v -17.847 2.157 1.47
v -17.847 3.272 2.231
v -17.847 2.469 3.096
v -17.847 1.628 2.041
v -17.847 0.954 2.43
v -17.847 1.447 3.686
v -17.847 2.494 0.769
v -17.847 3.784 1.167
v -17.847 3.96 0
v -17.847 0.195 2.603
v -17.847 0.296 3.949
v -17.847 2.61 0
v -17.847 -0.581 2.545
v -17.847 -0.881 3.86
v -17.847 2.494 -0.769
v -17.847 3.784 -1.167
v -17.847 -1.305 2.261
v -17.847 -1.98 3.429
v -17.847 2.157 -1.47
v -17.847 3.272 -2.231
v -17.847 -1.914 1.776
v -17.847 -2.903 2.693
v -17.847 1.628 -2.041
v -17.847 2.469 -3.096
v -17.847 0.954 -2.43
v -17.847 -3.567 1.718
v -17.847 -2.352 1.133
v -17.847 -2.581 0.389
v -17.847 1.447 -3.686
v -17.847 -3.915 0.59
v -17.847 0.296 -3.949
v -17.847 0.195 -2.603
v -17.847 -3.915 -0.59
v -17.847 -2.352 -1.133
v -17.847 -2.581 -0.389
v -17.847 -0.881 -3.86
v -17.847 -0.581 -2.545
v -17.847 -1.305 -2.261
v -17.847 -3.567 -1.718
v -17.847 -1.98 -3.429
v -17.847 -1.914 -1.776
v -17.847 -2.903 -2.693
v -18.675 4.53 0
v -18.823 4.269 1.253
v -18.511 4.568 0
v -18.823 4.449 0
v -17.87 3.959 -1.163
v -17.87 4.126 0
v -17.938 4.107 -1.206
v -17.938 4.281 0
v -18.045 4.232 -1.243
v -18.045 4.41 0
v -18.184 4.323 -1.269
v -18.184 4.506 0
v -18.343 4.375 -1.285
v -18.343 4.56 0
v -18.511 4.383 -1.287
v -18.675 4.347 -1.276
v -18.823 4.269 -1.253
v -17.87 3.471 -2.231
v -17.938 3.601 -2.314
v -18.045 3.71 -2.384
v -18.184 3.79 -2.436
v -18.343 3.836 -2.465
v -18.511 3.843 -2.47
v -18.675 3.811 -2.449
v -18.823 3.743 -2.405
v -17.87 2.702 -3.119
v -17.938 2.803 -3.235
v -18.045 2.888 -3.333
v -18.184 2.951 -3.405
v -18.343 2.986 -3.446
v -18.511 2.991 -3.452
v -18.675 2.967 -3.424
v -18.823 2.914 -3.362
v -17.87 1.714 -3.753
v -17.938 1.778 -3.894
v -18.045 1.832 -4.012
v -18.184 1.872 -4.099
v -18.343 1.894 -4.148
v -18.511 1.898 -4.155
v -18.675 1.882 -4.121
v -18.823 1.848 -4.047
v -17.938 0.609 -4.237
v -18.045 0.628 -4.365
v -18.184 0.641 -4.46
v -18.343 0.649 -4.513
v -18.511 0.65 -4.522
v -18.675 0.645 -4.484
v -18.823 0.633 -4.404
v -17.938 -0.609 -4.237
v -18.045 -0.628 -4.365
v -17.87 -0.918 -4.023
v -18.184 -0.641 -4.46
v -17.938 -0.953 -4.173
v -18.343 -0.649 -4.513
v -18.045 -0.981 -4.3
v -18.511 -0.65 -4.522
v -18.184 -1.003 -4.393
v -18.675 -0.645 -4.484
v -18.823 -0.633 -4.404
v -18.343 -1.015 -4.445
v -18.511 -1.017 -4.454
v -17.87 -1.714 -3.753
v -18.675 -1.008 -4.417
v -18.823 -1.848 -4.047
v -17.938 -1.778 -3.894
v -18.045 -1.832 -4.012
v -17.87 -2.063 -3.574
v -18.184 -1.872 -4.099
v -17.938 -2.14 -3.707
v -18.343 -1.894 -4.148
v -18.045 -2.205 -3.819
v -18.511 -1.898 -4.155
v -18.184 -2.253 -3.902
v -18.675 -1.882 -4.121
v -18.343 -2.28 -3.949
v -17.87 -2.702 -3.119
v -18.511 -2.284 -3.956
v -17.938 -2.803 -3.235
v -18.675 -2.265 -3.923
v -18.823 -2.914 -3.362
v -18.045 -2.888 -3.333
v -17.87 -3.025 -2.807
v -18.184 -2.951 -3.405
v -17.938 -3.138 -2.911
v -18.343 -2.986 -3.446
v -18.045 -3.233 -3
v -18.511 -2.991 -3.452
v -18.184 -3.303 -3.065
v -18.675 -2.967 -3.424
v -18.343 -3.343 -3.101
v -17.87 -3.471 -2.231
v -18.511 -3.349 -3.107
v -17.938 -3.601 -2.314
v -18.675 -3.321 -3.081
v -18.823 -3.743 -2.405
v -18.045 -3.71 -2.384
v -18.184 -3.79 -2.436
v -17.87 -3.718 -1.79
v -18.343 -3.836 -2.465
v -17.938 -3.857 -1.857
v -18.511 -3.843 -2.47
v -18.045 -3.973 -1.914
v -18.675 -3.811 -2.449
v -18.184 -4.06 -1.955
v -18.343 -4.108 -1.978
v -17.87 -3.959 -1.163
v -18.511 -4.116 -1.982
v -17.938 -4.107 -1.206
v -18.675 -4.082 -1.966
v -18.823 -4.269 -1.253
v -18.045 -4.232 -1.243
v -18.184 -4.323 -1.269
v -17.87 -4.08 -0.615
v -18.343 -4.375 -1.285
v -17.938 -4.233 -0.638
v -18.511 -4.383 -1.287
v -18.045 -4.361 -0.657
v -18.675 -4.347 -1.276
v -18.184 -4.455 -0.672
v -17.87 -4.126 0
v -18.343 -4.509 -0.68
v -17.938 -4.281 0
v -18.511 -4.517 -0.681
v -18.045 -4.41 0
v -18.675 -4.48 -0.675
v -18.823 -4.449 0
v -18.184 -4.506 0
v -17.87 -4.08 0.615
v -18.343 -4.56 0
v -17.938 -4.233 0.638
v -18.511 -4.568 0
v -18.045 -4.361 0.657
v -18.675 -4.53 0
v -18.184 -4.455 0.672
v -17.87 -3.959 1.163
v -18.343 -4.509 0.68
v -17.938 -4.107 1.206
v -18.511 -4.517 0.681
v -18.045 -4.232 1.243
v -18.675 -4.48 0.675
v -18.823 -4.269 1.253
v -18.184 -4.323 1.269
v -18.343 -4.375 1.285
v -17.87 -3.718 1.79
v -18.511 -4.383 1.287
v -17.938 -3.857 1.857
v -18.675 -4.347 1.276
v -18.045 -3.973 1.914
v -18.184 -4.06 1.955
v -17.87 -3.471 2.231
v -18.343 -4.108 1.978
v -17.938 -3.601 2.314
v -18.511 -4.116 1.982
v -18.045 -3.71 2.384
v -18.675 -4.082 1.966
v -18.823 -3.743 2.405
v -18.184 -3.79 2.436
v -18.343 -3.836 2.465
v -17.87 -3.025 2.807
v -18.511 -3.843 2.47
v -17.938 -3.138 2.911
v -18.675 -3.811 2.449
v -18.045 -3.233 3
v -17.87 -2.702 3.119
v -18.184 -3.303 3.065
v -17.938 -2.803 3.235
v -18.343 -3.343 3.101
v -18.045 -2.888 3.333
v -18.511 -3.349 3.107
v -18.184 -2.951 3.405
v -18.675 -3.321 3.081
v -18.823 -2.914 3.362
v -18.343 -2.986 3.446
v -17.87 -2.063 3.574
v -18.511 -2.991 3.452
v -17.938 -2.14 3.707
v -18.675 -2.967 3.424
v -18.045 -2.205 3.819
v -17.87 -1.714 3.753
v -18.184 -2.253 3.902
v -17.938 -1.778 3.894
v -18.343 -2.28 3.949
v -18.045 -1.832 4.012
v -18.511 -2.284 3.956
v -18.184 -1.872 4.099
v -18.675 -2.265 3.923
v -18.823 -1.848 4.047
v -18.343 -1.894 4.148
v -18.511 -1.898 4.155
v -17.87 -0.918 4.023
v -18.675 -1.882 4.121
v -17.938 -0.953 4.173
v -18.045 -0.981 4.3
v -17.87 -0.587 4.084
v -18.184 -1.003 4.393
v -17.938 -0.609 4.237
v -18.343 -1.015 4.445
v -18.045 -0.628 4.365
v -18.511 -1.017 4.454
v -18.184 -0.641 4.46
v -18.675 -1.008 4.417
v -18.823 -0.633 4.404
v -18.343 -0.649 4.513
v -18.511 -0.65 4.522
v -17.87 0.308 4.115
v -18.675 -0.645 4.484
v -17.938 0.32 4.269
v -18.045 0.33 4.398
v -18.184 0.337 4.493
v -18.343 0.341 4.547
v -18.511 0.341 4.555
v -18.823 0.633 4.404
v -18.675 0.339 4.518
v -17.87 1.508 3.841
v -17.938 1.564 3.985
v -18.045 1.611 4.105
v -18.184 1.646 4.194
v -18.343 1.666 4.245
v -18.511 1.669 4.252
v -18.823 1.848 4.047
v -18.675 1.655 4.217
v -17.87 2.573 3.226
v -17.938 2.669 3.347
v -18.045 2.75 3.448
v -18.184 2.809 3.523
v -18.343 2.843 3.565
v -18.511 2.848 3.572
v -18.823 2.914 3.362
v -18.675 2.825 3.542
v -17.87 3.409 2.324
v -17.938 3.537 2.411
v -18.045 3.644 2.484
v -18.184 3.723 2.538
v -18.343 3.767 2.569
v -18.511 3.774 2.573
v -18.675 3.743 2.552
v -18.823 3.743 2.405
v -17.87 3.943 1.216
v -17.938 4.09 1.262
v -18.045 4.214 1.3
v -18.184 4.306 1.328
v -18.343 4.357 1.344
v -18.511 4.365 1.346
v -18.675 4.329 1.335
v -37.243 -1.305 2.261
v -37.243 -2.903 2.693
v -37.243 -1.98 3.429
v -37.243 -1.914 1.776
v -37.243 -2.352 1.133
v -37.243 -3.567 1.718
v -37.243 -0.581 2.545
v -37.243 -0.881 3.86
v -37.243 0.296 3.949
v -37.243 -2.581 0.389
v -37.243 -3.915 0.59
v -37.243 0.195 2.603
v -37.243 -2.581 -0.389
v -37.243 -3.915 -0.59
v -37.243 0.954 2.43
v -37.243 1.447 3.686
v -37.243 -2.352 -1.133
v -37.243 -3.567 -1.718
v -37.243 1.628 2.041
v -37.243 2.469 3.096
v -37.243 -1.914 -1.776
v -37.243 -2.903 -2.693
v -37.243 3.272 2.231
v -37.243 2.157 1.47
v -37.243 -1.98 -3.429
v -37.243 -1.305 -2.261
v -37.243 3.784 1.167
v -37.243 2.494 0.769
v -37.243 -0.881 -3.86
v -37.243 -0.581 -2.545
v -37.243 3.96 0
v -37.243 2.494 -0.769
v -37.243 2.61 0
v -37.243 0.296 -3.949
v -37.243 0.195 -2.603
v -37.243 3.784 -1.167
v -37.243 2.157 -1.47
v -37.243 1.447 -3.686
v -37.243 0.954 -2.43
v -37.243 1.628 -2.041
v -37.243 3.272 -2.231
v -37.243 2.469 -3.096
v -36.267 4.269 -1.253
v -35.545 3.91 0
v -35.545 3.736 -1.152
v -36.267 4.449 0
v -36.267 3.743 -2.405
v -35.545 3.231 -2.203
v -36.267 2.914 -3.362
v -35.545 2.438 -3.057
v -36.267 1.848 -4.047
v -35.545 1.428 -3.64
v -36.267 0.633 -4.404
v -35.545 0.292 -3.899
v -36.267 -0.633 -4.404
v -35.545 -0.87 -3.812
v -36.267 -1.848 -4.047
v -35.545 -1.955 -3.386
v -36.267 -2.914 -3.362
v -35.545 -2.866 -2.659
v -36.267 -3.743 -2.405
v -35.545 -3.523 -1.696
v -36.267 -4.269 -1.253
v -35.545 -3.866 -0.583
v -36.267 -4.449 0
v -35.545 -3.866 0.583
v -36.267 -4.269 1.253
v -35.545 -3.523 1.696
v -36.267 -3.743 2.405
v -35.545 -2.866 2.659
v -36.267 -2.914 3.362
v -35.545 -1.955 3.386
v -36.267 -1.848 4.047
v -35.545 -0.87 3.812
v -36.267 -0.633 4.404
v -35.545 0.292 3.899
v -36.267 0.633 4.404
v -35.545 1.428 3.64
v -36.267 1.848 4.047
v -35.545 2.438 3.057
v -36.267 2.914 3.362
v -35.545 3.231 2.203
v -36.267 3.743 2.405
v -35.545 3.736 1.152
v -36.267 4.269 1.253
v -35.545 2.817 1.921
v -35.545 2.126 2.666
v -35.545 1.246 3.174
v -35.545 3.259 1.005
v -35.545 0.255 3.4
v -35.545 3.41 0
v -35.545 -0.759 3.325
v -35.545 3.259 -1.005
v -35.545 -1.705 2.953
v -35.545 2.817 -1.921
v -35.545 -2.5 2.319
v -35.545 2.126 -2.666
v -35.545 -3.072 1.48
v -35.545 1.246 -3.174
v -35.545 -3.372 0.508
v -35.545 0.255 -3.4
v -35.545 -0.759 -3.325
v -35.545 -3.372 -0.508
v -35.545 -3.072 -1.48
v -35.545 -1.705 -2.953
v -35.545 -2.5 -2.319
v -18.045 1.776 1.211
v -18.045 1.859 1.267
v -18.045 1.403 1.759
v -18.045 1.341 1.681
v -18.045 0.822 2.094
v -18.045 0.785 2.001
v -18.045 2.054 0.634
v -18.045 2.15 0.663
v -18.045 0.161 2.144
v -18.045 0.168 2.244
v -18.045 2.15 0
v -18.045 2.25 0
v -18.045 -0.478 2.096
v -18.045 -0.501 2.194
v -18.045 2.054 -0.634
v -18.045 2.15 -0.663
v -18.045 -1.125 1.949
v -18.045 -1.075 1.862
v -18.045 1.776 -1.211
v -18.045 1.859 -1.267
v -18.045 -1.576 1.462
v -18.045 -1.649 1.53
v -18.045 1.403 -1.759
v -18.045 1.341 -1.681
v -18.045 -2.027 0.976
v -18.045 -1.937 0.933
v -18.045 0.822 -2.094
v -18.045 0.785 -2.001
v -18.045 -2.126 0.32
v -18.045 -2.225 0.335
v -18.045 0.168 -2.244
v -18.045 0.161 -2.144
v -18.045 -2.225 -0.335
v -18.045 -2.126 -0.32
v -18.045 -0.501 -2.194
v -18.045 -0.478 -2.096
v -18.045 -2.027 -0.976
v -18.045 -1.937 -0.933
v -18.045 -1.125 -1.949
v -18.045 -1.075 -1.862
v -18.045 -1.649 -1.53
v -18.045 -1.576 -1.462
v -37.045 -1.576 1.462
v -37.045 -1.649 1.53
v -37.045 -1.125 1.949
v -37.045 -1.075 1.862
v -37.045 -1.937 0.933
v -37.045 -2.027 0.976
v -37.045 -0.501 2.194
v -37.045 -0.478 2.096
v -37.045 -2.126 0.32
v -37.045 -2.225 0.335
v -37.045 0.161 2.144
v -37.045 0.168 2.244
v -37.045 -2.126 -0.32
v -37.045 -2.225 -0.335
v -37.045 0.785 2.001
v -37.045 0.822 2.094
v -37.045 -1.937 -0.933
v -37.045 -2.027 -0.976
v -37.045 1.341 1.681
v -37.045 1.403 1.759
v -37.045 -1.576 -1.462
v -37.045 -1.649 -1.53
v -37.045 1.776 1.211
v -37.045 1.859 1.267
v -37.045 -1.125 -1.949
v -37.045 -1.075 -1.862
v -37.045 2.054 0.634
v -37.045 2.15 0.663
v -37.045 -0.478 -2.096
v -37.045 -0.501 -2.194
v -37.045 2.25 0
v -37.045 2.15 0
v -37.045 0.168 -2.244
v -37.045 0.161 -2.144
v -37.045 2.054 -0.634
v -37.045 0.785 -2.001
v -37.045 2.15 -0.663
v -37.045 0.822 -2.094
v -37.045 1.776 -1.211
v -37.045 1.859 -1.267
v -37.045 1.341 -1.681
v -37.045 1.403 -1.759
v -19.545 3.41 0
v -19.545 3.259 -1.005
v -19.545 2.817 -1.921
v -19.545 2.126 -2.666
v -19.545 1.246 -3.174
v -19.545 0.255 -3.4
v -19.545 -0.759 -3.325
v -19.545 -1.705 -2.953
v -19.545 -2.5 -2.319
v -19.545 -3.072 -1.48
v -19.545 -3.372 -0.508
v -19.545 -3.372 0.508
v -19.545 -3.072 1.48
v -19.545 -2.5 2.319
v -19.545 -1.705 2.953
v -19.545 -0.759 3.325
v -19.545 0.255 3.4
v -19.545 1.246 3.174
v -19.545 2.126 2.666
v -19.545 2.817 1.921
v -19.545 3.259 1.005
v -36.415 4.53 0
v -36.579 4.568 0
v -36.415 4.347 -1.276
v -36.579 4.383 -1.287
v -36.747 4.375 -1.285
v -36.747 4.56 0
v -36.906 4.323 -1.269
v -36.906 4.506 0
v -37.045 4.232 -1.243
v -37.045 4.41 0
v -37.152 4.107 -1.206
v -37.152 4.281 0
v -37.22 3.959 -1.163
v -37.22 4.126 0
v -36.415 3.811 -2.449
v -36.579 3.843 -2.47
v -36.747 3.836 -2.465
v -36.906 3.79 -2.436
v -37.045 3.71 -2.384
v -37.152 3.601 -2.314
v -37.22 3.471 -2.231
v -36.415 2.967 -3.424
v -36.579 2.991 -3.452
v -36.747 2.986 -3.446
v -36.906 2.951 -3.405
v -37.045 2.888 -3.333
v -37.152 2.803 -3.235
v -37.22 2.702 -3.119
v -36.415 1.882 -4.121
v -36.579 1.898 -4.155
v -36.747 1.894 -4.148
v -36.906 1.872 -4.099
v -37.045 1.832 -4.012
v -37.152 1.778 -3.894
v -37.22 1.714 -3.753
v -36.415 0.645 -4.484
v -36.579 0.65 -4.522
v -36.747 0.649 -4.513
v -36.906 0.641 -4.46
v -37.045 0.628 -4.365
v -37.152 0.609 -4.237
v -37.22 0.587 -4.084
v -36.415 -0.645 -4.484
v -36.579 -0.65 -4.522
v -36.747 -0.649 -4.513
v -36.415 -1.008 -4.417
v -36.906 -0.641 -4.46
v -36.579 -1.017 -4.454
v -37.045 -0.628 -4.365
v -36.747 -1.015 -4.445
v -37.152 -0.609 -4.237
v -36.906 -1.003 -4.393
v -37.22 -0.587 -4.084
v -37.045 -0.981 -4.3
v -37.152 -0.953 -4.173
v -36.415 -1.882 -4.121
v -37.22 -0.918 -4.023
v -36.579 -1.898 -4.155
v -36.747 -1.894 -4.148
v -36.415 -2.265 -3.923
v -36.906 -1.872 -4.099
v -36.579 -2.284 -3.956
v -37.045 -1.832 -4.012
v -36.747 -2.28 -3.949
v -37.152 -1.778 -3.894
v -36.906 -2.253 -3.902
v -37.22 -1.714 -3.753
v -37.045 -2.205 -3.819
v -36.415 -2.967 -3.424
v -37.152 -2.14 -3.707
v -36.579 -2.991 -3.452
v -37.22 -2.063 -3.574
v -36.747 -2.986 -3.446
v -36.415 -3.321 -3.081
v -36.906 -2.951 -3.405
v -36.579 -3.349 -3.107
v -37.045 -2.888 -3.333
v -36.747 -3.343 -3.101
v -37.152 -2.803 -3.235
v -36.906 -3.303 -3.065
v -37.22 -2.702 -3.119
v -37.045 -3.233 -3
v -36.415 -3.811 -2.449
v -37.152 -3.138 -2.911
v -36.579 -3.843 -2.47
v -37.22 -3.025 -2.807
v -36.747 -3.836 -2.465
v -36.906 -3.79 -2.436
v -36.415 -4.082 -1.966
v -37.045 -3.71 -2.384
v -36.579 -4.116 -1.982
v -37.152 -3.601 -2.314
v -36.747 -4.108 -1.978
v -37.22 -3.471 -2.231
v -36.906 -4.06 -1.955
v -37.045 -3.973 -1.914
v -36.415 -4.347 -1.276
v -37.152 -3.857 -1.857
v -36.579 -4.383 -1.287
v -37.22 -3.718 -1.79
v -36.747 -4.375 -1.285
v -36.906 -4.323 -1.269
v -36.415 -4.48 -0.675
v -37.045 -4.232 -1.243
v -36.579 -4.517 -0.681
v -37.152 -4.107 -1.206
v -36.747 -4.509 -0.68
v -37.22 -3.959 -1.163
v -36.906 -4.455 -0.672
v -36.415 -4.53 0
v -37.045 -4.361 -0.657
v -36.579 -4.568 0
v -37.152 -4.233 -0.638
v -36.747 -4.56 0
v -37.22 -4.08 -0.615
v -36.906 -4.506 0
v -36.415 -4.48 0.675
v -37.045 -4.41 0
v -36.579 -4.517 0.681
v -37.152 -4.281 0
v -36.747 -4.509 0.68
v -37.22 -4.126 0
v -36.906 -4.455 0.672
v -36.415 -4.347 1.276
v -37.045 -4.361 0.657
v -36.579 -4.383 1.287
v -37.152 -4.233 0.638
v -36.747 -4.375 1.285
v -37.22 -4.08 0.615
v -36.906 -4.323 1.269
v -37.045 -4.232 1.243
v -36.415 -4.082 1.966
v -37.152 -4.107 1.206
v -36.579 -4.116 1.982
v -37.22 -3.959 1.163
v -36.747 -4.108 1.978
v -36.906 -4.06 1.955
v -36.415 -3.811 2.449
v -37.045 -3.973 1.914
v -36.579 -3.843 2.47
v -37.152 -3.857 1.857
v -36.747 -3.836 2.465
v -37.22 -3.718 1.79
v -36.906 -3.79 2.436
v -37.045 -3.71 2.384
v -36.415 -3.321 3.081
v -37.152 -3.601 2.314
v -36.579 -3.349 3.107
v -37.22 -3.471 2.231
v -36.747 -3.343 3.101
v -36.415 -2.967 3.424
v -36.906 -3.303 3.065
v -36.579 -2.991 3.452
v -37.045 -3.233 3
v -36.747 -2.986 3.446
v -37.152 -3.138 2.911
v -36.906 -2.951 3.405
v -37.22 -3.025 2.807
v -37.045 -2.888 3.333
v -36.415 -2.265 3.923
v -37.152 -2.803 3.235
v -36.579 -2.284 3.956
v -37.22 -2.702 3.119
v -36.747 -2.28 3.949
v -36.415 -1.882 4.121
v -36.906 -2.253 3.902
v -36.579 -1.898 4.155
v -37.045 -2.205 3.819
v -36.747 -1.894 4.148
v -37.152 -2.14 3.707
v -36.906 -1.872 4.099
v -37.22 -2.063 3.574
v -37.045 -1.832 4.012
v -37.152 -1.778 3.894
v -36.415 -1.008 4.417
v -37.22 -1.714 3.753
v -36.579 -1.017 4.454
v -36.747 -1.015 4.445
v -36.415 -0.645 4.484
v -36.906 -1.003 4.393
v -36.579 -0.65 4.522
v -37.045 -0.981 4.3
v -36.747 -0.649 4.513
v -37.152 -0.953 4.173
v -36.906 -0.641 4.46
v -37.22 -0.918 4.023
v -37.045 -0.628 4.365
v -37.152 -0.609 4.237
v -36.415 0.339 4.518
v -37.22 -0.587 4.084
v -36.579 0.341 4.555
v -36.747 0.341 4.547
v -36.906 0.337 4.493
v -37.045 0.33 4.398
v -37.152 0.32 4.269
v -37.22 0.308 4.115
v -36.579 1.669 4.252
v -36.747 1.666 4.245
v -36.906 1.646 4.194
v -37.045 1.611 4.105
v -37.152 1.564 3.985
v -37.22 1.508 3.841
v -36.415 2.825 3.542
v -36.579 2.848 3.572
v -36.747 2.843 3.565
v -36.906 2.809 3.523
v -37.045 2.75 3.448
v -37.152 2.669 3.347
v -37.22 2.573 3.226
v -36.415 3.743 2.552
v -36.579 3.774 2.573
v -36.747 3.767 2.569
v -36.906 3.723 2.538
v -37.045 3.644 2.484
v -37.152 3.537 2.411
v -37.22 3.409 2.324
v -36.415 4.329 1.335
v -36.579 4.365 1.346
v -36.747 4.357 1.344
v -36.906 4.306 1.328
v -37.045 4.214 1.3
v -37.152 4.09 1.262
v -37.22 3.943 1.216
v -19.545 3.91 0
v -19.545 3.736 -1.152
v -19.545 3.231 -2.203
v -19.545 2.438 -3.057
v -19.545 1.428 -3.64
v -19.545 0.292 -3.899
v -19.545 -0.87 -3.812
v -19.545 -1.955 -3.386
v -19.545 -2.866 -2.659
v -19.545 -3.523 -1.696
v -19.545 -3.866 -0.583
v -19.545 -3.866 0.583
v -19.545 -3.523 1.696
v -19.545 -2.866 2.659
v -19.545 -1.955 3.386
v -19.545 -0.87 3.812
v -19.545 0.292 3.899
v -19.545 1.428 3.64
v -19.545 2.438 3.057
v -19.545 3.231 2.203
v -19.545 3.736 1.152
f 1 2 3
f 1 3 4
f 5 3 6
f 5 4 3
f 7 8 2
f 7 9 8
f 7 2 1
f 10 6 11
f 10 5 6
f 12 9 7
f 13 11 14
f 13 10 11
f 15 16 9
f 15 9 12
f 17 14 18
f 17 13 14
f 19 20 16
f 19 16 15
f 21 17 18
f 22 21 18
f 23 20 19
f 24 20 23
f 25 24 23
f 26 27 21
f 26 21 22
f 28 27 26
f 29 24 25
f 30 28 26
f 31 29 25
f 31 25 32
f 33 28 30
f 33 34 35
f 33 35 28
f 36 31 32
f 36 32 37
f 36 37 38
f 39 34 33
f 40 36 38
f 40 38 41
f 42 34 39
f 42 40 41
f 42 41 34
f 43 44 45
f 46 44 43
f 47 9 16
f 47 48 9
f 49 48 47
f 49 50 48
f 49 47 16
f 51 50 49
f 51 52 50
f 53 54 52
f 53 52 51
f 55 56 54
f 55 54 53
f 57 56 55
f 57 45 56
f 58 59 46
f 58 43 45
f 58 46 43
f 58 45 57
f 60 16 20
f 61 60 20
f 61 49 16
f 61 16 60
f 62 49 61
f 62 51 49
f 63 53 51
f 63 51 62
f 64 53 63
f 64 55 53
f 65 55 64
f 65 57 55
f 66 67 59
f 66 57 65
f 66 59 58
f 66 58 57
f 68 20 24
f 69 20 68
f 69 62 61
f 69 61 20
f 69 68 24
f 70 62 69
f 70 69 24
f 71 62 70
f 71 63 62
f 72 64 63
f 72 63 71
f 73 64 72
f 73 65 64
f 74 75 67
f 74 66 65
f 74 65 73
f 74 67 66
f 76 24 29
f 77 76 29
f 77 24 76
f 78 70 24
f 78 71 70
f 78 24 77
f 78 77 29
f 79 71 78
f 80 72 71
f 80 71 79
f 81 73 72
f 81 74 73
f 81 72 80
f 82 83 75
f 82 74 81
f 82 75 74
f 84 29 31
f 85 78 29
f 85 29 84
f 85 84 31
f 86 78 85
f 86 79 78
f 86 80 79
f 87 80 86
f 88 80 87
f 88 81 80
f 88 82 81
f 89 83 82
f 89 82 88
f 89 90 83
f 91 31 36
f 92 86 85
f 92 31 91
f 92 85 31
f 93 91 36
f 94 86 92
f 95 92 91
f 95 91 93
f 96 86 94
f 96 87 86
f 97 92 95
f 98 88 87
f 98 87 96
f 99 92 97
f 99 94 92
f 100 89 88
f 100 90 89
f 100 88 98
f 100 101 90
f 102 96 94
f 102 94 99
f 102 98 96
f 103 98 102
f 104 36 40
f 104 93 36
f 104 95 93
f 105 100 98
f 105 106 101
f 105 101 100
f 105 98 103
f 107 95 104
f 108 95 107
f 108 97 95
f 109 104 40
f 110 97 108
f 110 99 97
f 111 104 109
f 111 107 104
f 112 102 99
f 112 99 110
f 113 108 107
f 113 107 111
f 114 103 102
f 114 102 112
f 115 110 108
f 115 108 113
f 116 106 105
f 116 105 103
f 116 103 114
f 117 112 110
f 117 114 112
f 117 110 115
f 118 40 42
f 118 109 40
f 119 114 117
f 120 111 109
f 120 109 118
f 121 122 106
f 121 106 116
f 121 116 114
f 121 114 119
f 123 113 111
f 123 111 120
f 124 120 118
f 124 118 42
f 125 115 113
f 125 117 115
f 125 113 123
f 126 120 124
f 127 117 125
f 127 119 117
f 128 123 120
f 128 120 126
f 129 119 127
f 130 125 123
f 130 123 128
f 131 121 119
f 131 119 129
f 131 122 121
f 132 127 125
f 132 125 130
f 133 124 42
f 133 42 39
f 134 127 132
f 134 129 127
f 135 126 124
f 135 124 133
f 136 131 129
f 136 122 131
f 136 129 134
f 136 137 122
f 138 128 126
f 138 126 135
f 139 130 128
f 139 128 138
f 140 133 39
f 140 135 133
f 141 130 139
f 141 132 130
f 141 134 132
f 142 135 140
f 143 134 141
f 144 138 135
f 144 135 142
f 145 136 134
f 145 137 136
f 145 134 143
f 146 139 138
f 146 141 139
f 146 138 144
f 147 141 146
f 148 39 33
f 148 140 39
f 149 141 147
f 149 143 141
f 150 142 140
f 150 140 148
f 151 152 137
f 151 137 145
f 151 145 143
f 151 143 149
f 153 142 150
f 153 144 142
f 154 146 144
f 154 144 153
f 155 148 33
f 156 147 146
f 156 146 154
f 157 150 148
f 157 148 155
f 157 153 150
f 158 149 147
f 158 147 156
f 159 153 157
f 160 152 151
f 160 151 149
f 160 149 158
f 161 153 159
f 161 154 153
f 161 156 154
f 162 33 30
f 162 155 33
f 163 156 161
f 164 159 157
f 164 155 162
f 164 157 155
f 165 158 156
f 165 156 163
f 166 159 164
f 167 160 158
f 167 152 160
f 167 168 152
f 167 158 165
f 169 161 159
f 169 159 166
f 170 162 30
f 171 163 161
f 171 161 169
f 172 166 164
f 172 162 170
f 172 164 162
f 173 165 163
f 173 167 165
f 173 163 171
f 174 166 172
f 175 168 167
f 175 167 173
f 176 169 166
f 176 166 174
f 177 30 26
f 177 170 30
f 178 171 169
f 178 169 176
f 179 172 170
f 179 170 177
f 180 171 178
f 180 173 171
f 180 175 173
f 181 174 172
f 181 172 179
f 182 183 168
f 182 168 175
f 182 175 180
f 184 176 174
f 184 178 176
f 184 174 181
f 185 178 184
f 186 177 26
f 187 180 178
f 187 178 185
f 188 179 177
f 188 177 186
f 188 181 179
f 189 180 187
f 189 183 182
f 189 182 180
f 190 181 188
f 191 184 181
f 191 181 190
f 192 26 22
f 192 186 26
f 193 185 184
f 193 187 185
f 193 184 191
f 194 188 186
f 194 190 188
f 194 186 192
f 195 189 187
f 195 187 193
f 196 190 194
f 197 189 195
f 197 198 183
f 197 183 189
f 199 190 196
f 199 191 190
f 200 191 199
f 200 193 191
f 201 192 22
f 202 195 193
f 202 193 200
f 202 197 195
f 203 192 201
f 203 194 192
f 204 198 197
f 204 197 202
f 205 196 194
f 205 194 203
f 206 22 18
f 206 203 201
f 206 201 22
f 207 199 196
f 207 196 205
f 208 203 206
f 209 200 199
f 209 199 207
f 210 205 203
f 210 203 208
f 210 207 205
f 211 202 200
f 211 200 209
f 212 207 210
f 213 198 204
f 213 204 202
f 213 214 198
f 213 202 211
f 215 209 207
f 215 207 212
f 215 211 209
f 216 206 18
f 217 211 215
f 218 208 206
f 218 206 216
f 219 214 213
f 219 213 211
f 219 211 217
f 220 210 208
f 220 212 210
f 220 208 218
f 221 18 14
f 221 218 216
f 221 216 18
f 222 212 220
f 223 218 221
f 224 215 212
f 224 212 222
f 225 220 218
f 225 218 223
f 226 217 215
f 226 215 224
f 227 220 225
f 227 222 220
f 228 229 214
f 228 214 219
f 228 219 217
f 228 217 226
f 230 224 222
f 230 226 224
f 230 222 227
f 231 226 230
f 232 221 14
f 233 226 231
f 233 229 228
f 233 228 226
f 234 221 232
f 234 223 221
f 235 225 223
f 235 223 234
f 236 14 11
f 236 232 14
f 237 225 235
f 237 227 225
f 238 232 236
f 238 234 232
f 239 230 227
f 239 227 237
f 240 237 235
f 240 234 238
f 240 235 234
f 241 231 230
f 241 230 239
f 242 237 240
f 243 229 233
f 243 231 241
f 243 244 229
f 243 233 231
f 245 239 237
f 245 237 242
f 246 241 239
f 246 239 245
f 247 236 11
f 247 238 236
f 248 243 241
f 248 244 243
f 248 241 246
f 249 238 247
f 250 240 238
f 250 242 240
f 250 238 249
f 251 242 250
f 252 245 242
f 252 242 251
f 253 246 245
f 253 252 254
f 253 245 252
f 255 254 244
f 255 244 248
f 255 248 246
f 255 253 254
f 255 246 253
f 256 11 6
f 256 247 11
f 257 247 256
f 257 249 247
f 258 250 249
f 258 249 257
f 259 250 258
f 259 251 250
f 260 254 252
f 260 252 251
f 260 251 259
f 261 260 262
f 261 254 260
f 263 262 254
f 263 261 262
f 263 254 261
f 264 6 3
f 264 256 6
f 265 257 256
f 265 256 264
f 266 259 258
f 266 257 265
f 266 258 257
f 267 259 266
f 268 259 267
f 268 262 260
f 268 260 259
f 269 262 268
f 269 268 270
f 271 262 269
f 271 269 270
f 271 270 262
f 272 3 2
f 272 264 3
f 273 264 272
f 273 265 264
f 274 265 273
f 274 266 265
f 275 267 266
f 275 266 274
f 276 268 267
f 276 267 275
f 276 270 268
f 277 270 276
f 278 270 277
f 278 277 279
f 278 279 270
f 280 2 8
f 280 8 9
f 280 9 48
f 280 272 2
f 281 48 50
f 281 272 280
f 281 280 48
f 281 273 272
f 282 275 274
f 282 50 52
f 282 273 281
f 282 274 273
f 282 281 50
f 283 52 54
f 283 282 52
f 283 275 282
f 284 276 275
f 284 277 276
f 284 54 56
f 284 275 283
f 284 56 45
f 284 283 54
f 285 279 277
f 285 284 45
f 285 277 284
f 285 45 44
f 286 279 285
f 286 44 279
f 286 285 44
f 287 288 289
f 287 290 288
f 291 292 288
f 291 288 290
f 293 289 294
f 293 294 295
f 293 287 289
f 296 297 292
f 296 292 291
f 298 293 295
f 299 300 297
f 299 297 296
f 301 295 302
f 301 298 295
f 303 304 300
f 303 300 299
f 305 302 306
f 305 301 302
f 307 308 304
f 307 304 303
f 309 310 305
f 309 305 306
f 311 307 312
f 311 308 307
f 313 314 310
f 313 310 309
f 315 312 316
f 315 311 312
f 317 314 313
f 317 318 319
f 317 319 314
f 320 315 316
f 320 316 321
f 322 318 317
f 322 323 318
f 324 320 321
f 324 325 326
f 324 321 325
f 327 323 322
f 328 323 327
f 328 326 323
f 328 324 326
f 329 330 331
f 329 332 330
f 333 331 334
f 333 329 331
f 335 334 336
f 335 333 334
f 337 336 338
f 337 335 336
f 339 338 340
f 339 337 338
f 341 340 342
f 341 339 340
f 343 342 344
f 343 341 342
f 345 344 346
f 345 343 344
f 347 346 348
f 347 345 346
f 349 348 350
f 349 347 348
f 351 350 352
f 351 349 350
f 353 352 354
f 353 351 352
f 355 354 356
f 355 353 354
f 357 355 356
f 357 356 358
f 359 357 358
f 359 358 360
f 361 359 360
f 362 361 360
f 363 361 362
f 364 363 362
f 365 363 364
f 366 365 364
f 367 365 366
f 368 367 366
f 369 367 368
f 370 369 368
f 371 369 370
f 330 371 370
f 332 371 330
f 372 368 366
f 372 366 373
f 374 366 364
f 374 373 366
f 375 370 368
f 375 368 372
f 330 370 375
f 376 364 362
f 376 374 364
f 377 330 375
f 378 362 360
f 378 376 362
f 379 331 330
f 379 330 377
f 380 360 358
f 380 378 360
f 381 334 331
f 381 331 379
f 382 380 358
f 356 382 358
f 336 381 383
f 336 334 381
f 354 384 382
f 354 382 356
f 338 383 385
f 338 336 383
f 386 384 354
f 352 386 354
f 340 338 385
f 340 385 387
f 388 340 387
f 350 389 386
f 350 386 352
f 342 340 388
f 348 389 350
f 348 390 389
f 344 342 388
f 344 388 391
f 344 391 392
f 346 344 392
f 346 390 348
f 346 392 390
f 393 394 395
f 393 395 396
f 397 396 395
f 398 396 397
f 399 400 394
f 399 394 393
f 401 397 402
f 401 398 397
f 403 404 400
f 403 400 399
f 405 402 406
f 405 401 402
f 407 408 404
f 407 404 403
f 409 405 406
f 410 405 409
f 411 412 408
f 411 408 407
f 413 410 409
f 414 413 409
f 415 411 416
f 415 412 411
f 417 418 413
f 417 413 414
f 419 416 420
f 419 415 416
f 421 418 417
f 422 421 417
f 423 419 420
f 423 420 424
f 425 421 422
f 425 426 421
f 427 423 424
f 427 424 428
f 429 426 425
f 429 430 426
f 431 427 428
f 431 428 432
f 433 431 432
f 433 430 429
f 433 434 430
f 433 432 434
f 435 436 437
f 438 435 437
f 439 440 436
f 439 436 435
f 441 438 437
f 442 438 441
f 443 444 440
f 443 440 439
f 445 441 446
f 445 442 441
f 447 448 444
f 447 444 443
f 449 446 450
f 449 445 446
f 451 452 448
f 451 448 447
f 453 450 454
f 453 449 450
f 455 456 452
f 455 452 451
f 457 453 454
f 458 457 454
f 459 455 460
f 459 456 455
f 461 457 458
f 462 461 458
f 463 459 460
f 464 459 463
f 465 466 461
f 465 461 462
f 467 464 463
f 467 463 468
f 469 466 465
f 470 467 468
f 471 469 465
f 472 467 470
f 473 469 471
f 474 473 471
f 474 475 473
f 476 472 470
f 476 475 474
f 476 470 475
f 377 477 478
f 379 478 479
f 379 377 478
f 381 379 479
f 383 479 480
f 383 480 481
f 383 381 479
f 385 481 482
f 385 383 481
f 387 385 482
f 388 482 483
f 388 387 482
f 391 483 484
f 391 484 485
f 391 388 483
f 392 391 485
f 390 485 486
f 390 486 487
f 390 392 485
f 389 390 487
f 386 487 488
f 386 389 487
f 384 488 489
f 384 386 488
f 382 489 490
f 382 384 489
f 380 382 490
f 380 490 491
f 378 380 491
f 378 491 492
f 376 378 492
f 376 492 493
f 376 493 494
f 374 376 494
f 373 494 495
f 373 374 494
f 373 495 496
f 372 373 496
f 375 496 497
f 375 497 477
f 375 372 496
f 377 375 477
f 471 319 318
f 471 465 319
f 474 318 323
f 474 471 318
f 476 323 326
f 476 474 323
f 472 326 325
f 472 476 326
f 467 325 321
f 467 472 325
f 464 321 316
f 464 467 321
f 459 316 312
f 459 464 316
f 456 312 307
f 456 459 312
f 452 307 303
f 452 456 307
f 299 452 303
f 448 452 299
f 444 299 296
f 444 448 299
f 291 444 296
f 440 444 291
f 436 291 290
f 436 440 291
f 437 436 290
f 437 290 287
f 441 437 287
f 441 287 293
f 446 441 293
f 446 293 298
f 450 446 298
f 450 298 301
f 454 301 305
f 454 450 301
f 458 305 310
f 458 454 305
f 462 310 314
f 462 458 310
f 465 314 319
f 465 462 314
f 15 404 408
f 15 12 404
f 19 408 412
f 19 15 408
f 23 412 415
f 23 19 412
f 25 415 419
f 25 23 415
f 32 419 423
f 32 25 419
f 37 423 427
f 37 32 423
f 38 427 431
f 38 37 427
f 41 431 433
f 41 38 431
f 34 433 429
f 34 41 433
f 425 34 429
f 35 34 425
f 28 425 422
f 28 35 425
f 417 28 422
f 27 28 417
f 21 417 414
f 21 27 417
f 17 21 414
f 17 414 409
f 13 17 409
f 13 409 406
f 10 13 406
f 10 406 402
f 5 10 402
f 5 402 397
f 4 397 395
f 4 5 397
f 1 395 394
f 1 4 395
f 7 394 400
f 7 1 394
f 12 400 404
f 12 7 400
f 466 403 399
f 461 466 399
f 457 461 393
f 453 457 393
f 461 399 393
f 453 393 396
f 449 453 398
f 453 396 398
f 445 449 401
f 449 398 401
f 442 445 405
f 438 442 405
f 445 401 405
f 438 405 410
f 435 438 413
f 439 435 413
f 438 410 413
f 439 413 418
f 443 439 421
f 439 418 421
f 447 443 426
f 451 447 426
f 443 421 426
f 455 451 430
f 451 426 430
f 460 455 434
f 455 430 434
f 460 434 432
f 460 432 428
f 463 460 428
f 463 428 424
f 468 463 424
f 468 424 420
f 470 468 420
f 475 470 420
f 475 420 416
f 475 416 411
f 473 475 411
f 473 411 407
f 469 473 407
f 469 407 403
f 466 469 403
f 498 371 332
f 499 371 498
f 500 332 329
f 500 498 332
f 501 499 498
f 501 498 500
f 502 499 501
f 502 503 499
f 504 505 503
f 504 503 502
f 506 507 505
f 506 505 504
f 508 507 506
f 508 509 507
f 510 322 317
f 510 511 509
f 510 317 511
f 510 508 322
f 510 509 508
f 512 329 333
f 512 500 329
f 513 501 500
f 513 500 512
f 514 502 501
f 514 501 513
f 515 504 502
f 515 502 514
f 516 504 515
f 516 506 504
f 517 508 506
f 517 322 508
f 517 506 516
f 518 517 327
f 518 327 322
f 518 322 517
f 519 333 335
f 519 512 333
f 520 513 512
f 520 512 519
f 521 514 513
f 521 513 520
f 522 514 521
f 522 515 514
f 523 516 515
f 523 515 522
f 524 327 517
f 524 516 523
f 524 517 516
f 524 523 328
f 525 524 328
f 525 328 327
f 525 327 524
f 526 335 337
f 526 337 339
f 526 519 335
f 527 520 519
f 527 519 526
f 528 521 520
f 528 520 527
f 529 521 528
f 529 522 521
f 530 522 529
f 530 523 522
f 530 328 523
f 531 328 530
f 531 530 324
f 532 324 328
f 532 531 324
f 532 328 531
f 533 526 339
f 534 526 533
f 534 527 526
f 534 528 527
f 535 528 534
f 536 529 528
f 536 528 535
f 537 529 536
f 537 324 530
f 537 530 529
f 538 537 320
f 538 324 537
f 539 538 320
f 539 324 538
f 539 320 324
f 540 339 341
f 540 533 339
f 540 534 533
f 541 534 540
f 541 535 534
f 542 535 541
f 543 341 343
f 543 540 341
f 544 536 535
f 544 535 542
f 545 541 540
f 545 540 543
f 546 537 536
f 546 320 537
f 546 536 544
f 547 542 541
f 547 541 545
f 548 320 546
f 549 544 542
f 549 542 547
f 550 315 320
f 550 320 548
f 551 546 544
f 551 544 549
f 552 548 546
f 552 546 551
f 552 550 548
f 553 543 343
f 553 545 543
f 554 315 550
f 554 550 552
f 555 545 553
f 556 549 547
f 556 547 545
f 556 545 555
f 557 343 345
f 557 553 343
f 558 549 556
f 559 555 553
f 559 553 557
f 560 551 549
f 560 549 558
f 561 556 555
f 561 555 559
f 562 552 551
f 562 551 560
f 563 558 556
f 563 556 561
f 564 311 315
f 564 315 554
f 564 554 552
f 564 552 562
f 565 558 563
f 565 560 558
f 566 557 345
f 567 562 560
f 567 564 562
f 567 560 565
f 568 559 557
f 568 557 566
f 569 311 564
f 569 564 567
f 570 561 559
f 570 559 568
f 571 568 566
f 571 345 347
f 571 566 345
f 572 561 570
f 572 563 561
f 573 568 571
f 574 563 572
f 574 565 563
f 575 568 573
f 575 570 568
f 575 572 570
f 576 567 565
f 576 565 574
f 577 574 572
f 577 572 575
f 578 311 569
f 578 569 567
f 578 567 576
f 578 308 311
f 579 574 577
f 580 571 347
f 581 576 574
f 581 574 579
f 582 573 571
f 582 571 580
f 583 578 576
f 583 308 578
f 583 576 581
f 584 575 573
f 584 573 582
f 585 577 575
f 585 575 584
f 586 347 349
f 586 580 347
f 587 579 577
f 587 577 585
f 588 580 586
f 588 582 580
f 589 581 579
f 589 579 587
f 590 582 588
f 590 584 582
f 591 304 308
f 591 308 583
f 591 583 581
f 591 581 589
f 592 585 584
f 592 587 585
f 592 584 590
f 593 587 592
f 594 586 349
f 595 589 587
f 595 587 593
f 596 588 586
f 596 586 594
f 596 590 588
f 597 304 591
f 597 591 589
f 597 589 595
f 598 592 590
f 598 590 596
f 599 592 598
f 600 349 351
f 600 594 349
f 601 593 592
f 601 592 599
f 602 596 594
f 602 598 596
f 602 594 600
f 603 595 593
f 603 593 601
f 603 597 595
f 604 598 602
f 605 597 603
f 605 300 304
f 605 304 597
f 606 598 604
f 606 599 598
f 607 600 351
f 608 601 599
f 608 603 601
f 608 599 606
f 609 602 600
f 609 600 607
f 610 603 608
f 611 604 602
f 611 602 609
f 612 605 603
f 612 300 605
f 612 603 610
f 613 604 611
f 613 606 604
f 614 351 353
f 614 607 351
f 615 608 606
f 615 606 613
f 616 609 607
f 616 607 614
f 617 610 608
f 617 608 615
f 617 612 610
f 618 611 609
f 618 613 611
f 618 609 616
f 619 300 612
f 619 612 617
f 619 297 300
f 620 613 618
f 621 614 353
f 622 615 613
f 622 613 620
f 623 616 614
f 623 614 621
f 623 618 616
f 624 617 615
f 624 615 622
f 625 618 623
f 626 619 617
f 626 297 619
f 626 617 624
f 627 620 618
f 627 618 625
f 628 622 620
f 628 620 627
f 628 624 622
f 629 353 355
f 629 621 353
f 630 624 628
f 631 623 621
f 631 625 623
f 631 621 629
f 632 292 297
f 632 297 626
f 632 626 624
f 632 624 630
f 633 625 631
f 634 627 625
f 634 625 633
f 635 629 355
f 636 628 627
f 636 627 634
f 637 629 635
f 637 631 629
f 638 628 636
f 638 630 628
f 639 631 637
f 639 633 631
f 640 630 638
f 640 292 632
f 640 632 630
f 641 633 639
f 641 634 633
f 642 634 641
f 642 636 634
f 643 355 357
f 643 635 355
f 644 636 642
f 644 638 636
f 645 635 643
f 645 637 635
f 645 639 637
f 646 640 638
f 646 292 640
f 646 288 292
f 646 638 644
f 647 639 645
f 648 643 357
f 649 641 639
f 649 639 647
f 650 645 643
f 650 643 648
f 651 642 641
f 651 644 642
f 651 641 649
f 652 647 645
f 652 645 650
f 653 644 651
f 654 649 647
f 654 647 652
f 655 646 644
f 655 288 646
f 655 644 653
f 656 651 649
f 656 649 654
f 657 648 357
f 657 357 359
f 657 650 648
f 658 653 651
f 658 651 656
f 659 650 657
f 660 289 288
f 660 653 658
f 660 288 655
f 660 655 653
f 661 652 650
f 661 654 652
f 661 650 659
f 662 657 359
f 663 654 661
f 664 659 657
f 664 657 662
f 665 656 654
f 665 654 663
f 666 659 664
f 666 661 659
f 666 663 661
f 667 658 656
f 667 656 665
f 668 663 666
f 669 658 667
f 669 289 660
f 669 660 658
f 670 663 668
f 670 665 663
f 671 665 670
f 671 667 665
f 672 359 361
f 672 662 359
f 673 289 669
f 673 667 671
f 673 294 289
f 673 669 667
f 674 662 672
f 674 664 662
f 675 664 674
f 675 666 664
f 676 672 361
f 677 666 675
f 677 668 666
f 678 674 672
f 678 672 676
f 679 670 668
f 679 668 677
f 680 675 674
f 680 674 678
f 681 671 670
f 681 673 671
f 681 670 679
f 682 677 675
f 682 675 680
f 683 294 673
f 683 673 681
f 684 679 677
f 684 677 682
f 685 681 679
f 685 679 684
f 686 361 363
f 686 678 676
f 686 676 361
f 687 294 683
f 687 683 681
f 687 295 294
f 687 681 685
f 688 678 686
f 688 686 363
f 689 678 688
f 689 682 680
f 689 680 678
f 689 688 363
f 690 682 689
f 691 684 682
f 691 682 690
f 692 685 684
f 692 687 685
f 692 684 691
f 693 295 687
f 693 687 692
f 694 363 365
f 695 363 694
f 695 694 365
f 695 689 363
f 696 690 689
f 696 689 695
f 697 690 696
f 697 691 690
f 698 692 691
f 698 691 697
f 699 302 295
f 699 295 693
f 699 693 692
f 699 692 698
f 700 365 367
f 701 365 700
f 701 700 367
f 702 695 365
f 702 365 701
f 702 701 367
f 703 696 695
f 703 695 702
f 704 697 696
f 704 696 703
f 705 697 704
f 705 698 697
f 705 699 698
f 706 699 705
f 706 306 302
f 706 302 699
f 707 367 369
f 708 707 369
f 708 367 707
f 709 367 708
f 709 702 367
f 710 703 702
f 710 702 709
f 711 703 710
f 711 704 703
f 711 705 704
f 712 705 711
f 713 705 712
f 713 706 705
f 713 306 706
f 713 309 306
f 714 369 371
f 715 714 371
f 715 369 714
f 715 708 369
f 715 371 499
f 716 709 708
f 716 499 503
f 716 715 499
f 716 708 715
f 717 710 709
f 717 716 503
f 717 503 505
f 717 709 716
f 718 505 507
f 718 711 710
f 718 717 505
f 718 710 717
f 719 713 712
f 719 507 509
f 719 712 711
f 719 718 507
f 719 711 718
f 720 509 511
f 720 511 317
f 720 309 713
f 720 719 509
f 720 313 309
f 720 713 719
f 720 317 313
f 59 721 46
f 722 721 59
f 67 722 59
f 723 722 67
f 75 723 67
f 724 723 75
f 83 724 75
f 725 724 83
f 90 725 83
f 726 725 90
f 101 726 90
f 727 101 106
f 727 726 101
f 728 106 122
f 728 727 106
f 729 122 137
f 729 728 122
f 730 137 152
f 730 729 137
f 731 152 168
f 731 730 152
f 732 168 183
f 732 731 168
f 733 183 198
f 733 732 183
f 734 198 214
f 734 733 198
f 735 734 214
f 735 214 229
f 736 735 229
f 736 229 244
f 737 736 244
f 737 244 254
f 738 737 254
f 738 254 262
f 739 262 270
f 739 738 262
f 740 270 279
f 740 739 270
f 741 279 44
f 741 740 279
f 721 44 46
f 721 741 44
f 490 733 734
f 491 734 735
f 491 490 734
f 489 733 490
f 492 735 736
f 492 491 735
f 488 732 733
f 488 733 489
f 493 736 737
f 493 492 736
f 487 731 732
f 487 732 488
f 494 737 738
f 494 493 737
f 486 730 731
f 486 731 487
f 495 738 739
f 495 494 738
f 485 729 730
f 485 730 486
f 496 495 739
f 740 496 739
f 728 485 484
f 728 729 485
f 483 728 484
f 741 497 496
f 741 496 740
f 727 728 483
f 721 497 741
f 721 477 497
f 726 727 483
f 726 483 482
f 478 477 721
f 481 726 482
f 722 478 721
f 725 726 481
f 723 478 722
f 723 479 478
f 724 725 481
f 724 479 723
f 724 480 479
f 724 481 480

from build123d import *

# Parameters (mm, degrees)
SKETCH4_R          = 2.15
CUT_EXTRUDE1_DEPTH = 28


with BuildPart() as part:
    # Sketch1 → Revolve1 (revolve)
    with BuildSketch(Plane.XY):
        with BuildLine():
            Line((-37.045023651, 0), (-18.045023651, 0))
            Line((-18.045023651, 0), (-18.045023651, 2.25))
            Line((-18.045023651, 2.25), (-17.846575332, 2.610383943))
            Line((-17.846575332, 2.610383943), (-17.846575332, 3.959600078))
            ThreePointArc((-17.846575332, 3.959600078), (-18.183709968, 4.505741021), (-18.823024722, 4.449116479))
            Line((-18.823024722, 4.449116479), (-19.545023651, 3.91))
            Line((-19.545023651, 3.91), (-19.545023651, 3.41))
            Line((-19.545023651, 3.41), (-35.545023651, 3.41))
            Line((-35.545023651, 3.41), (-35.545023651, 3.91))
            Line((-35.545023651, 3.91), (-36.267022579, 4.449116479))
            ThreePointArc((-36.267022579, 4.449116479), (-36.906337333, 4.505741021), (-37.24347197, 3.959600078))
            Line((-37.24347197, 3.959600078), (-37.24347197, 2.610383943))
            Line((-37.24347197, 2.610383943), (-37.045023651, 2.25))
            Line((-37.045023651, 2.25), (-37.045023651, 0))
        make_face()
    revolve(axis=Axis((-9.250519902, 0, 0), (-1, 0, 0)))

    # Sketch4 → Cut-Extrude1 (cut)
    with BuildSketch(Plane(origin=(-18.045023651, 0, 0), x_dir=(0, 0, -1), z_dir=(1, 0, 0))):
        with Locations(Location((0, 0, 0), (0, 0, 90))):
            Circle(SKETCH4_R)
    extrude(amount=-CUT_EXTRUDE1_DEPTH, mode=Mode.SUBTRACT)


solid = part.part
